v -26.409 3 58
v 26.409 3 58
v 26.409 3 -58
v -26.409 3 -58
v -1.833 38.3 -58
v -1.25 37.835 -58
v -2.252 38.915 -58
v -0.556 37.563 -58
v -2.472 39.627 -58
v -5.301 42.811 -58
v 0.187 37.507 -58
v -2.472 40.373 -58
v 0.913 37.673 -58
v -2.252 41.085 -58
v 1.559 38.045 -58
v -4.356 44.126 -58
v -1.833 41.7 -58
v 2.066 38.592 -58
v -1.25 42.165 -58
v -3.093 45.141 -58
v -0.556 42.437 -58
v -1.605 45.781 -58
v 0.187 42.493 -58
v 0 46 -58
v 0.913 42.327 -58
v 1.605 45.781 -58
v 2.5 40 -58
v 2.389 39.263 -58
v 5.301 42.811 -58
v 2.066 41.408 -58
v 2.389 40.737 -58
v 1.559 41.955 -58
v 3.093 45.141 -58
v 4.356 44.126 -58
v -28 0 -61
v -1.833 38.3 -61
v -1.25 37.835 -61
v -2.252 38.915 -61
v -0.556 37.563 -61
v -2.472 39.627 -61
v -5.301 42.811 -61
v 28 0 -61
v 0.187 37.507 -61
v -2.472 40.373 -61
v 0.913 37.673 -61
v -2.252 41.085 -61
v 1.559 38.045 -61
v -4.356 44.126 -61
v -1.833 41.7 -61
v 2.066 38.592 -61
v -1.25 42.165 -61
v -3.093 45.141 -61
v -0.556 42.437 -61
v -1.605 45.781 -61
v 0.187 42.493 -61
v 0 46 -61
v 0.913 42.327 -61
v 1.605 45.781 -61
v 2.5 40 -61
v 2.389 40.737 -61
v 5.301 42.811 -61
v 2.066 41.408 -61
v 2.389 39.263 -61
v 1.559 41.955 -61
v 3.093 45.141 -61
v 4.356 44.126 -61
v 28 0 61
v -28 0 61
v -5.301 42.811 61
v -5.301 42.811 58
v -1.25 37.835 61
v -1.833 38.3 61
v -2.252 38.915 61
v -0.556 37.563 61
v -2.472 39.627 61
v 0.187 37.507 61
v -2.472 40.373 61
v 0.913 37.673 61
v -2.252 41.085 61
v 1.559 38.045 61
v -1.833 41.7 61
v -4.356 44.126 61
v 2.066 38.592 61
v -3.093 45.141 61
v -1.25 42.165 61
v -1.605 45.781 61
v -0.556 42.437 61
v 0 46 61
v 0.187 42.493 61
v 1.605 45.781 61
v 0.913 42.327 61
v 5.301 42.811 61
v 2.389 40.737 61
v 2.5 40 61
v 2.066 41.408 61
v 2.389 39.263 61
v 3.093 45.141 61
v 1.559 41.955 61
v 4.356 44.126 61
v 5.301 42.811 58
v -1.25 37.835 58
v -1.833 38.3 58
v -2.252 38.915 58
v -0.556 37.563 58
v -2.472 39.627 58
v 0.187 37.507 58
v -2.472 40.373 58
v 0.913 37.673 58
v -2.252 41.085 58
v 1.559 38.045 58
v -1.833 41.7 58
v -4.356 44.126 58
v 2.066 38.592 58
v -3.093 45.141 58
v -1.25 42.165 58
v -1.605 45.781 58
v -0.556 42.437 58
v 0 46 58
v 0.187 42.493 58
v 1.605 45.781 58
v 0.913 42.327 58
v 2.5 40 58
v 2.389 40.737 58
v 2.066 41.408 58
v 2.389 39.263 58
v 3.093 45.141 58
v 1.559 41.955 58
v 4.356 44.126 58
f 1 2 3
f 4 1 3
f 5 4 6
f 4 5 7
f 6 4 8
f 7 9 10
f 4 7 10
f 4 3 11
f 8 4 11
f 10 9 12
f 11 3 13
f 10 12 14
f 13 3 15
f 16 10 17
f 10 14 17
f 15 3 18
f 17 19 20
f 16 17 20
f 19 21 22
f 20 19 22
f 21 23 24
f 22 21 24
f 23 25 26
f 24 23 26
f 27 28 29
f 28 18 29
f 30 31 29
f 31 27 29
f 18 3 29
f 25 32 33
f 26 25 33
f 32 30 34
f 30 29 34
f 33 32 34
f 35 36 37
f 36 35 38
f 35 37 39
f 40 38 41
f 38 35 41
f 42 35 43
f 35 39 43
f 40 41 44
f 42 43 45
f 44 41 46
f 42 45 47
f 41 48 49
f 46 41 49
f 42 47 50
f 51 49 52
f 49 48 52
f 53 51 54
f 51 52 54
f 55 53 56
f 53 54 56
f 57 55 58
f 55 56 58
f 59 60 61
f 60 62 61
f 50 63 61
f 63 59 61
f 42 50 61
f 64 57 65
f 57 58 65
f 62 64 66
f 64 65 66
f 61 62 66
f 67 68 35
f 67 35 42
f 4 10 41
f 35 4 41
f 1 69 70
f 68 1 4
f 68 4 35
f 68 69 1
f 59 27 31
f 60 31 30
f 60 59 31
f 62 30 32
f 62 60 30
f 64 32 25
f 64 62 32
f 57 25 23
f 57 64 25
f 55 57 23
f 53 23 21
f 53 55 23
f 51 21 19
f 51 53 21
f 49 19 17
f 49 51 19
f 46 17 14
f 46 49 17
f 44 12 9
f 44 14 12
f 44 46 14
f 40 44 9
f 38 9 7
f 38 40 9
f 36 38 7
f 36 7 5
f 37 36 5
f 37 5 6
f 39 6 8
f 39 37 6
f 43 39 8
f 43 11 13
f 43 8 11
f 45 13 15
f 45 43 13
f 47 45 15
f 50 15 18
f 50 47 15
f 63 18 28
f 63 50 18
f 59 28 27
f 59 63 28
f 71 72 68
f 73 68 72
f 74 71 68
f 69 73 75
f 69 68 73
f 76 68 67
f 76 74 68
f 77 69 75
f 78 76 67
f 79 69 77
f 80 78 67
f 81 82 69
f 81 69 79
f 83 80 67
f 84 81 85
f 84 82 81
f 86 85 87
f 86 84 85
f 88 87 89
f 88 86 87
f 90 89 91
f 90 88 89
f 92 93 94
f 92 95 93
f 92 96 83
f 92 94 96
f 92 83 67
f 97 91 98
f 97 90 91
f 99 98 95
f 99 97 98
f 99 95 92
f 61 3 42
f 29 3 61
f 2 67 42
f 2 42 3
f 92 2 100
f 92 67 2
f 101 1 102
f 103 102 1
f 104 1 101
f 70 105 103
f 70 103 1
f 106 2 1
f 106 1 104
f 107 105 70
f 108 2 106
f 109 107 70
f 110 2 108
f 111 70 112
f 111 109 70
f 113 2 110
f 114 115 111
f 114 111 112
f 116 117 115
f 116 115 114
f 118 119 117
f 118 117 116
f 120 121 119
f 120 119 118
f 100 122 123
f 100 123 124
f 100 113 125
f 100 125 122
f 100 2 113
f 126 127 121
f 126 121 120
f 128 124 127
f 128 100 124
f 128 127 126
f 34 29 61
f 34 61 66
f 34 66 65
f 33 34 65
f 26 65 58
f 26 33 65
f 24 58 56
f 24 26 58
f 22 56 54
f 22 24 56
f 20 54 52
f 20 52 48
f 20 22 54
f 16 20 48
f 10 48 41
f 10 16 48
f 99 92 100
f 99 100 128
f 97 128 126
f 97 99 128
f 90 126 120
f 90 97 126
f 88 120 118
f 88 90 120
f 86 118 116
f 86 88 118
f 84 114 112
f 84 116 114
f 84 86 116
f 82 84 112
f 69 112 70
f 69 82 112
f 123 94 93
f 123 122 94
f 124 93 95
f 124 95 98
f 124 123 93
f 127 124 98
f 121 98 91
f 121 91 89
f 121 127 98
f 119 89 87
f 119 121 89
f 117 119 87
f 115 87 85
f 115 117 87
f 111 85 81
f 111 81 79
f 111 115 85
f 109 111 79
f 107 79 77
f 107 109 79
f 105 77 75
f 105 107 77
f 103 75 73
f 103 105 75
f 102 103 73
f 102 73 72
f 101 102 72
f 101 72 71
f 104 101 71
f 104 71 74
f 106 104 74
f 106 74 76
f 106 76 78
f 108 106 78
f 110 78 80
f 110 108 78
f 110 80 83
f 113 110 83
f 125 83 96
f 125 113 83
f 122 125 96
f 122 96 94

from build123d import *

# Parameters (mm, degrees)
ESQUISSE1_R                  = 2.5
BOSS_EXTRU_1_DEPTH           = 61
ESQUISSE2_W                  = 116
ESQUISSE2_H                  = 43
ENL_V_MAT_EXTRU_1_DEPTH      = 29
ENL_V_MAT_EXTRU_1_DEPTH_BACK = 29


with BuildPart() as part:
    # Esquisse1 → Boss.-Extru.1 (new body, symmetric)
    with BuildSketch(Plane.XY):
        with BuildLine():
            Line((-5.300956284, 42.810669399), (-28, 0))
            Line((-28, 0), (28, 0))
            Line((28, 0), (5.300956284, 42.810669399))
            ThreePointArc((5.300956284, 42.810669399), (0, 46), (-5.300956284, 42.810669399))
        make_face()
        with Locations((0, 40)):
            Circle(ESQUISSE1_R, mode=Mode.SUBTRACT)
    extrude(amount=BOSS_EXTRU_1_DEPTH, both=True)

    # Esquisse2 → Enlèv. mat.-Extru.1 (cut, two sides)
    with BuildSketch(Plane(origin=(0, 0, 0), x_dir=(0, 0, -1), z_dir=(1, 0, 0))) as enl_v_mat_extru_1_sk:
        with Locations((0, 24.5)):
            Rectangle(ESQUISSE2_W, ESQUISSE2_H)
    extrude(amount=ENL_V_MAT_EXTRU_1_DEPTH, mode=Mode.SUBTRACT)
    extrude(enl_v_mat_extru_1_sk.sketch, amount=-ENL_V_MAT_EXTRU_1_DEPTH_BACK, mode=Mode.SUBTRACT)


solid = part.part
